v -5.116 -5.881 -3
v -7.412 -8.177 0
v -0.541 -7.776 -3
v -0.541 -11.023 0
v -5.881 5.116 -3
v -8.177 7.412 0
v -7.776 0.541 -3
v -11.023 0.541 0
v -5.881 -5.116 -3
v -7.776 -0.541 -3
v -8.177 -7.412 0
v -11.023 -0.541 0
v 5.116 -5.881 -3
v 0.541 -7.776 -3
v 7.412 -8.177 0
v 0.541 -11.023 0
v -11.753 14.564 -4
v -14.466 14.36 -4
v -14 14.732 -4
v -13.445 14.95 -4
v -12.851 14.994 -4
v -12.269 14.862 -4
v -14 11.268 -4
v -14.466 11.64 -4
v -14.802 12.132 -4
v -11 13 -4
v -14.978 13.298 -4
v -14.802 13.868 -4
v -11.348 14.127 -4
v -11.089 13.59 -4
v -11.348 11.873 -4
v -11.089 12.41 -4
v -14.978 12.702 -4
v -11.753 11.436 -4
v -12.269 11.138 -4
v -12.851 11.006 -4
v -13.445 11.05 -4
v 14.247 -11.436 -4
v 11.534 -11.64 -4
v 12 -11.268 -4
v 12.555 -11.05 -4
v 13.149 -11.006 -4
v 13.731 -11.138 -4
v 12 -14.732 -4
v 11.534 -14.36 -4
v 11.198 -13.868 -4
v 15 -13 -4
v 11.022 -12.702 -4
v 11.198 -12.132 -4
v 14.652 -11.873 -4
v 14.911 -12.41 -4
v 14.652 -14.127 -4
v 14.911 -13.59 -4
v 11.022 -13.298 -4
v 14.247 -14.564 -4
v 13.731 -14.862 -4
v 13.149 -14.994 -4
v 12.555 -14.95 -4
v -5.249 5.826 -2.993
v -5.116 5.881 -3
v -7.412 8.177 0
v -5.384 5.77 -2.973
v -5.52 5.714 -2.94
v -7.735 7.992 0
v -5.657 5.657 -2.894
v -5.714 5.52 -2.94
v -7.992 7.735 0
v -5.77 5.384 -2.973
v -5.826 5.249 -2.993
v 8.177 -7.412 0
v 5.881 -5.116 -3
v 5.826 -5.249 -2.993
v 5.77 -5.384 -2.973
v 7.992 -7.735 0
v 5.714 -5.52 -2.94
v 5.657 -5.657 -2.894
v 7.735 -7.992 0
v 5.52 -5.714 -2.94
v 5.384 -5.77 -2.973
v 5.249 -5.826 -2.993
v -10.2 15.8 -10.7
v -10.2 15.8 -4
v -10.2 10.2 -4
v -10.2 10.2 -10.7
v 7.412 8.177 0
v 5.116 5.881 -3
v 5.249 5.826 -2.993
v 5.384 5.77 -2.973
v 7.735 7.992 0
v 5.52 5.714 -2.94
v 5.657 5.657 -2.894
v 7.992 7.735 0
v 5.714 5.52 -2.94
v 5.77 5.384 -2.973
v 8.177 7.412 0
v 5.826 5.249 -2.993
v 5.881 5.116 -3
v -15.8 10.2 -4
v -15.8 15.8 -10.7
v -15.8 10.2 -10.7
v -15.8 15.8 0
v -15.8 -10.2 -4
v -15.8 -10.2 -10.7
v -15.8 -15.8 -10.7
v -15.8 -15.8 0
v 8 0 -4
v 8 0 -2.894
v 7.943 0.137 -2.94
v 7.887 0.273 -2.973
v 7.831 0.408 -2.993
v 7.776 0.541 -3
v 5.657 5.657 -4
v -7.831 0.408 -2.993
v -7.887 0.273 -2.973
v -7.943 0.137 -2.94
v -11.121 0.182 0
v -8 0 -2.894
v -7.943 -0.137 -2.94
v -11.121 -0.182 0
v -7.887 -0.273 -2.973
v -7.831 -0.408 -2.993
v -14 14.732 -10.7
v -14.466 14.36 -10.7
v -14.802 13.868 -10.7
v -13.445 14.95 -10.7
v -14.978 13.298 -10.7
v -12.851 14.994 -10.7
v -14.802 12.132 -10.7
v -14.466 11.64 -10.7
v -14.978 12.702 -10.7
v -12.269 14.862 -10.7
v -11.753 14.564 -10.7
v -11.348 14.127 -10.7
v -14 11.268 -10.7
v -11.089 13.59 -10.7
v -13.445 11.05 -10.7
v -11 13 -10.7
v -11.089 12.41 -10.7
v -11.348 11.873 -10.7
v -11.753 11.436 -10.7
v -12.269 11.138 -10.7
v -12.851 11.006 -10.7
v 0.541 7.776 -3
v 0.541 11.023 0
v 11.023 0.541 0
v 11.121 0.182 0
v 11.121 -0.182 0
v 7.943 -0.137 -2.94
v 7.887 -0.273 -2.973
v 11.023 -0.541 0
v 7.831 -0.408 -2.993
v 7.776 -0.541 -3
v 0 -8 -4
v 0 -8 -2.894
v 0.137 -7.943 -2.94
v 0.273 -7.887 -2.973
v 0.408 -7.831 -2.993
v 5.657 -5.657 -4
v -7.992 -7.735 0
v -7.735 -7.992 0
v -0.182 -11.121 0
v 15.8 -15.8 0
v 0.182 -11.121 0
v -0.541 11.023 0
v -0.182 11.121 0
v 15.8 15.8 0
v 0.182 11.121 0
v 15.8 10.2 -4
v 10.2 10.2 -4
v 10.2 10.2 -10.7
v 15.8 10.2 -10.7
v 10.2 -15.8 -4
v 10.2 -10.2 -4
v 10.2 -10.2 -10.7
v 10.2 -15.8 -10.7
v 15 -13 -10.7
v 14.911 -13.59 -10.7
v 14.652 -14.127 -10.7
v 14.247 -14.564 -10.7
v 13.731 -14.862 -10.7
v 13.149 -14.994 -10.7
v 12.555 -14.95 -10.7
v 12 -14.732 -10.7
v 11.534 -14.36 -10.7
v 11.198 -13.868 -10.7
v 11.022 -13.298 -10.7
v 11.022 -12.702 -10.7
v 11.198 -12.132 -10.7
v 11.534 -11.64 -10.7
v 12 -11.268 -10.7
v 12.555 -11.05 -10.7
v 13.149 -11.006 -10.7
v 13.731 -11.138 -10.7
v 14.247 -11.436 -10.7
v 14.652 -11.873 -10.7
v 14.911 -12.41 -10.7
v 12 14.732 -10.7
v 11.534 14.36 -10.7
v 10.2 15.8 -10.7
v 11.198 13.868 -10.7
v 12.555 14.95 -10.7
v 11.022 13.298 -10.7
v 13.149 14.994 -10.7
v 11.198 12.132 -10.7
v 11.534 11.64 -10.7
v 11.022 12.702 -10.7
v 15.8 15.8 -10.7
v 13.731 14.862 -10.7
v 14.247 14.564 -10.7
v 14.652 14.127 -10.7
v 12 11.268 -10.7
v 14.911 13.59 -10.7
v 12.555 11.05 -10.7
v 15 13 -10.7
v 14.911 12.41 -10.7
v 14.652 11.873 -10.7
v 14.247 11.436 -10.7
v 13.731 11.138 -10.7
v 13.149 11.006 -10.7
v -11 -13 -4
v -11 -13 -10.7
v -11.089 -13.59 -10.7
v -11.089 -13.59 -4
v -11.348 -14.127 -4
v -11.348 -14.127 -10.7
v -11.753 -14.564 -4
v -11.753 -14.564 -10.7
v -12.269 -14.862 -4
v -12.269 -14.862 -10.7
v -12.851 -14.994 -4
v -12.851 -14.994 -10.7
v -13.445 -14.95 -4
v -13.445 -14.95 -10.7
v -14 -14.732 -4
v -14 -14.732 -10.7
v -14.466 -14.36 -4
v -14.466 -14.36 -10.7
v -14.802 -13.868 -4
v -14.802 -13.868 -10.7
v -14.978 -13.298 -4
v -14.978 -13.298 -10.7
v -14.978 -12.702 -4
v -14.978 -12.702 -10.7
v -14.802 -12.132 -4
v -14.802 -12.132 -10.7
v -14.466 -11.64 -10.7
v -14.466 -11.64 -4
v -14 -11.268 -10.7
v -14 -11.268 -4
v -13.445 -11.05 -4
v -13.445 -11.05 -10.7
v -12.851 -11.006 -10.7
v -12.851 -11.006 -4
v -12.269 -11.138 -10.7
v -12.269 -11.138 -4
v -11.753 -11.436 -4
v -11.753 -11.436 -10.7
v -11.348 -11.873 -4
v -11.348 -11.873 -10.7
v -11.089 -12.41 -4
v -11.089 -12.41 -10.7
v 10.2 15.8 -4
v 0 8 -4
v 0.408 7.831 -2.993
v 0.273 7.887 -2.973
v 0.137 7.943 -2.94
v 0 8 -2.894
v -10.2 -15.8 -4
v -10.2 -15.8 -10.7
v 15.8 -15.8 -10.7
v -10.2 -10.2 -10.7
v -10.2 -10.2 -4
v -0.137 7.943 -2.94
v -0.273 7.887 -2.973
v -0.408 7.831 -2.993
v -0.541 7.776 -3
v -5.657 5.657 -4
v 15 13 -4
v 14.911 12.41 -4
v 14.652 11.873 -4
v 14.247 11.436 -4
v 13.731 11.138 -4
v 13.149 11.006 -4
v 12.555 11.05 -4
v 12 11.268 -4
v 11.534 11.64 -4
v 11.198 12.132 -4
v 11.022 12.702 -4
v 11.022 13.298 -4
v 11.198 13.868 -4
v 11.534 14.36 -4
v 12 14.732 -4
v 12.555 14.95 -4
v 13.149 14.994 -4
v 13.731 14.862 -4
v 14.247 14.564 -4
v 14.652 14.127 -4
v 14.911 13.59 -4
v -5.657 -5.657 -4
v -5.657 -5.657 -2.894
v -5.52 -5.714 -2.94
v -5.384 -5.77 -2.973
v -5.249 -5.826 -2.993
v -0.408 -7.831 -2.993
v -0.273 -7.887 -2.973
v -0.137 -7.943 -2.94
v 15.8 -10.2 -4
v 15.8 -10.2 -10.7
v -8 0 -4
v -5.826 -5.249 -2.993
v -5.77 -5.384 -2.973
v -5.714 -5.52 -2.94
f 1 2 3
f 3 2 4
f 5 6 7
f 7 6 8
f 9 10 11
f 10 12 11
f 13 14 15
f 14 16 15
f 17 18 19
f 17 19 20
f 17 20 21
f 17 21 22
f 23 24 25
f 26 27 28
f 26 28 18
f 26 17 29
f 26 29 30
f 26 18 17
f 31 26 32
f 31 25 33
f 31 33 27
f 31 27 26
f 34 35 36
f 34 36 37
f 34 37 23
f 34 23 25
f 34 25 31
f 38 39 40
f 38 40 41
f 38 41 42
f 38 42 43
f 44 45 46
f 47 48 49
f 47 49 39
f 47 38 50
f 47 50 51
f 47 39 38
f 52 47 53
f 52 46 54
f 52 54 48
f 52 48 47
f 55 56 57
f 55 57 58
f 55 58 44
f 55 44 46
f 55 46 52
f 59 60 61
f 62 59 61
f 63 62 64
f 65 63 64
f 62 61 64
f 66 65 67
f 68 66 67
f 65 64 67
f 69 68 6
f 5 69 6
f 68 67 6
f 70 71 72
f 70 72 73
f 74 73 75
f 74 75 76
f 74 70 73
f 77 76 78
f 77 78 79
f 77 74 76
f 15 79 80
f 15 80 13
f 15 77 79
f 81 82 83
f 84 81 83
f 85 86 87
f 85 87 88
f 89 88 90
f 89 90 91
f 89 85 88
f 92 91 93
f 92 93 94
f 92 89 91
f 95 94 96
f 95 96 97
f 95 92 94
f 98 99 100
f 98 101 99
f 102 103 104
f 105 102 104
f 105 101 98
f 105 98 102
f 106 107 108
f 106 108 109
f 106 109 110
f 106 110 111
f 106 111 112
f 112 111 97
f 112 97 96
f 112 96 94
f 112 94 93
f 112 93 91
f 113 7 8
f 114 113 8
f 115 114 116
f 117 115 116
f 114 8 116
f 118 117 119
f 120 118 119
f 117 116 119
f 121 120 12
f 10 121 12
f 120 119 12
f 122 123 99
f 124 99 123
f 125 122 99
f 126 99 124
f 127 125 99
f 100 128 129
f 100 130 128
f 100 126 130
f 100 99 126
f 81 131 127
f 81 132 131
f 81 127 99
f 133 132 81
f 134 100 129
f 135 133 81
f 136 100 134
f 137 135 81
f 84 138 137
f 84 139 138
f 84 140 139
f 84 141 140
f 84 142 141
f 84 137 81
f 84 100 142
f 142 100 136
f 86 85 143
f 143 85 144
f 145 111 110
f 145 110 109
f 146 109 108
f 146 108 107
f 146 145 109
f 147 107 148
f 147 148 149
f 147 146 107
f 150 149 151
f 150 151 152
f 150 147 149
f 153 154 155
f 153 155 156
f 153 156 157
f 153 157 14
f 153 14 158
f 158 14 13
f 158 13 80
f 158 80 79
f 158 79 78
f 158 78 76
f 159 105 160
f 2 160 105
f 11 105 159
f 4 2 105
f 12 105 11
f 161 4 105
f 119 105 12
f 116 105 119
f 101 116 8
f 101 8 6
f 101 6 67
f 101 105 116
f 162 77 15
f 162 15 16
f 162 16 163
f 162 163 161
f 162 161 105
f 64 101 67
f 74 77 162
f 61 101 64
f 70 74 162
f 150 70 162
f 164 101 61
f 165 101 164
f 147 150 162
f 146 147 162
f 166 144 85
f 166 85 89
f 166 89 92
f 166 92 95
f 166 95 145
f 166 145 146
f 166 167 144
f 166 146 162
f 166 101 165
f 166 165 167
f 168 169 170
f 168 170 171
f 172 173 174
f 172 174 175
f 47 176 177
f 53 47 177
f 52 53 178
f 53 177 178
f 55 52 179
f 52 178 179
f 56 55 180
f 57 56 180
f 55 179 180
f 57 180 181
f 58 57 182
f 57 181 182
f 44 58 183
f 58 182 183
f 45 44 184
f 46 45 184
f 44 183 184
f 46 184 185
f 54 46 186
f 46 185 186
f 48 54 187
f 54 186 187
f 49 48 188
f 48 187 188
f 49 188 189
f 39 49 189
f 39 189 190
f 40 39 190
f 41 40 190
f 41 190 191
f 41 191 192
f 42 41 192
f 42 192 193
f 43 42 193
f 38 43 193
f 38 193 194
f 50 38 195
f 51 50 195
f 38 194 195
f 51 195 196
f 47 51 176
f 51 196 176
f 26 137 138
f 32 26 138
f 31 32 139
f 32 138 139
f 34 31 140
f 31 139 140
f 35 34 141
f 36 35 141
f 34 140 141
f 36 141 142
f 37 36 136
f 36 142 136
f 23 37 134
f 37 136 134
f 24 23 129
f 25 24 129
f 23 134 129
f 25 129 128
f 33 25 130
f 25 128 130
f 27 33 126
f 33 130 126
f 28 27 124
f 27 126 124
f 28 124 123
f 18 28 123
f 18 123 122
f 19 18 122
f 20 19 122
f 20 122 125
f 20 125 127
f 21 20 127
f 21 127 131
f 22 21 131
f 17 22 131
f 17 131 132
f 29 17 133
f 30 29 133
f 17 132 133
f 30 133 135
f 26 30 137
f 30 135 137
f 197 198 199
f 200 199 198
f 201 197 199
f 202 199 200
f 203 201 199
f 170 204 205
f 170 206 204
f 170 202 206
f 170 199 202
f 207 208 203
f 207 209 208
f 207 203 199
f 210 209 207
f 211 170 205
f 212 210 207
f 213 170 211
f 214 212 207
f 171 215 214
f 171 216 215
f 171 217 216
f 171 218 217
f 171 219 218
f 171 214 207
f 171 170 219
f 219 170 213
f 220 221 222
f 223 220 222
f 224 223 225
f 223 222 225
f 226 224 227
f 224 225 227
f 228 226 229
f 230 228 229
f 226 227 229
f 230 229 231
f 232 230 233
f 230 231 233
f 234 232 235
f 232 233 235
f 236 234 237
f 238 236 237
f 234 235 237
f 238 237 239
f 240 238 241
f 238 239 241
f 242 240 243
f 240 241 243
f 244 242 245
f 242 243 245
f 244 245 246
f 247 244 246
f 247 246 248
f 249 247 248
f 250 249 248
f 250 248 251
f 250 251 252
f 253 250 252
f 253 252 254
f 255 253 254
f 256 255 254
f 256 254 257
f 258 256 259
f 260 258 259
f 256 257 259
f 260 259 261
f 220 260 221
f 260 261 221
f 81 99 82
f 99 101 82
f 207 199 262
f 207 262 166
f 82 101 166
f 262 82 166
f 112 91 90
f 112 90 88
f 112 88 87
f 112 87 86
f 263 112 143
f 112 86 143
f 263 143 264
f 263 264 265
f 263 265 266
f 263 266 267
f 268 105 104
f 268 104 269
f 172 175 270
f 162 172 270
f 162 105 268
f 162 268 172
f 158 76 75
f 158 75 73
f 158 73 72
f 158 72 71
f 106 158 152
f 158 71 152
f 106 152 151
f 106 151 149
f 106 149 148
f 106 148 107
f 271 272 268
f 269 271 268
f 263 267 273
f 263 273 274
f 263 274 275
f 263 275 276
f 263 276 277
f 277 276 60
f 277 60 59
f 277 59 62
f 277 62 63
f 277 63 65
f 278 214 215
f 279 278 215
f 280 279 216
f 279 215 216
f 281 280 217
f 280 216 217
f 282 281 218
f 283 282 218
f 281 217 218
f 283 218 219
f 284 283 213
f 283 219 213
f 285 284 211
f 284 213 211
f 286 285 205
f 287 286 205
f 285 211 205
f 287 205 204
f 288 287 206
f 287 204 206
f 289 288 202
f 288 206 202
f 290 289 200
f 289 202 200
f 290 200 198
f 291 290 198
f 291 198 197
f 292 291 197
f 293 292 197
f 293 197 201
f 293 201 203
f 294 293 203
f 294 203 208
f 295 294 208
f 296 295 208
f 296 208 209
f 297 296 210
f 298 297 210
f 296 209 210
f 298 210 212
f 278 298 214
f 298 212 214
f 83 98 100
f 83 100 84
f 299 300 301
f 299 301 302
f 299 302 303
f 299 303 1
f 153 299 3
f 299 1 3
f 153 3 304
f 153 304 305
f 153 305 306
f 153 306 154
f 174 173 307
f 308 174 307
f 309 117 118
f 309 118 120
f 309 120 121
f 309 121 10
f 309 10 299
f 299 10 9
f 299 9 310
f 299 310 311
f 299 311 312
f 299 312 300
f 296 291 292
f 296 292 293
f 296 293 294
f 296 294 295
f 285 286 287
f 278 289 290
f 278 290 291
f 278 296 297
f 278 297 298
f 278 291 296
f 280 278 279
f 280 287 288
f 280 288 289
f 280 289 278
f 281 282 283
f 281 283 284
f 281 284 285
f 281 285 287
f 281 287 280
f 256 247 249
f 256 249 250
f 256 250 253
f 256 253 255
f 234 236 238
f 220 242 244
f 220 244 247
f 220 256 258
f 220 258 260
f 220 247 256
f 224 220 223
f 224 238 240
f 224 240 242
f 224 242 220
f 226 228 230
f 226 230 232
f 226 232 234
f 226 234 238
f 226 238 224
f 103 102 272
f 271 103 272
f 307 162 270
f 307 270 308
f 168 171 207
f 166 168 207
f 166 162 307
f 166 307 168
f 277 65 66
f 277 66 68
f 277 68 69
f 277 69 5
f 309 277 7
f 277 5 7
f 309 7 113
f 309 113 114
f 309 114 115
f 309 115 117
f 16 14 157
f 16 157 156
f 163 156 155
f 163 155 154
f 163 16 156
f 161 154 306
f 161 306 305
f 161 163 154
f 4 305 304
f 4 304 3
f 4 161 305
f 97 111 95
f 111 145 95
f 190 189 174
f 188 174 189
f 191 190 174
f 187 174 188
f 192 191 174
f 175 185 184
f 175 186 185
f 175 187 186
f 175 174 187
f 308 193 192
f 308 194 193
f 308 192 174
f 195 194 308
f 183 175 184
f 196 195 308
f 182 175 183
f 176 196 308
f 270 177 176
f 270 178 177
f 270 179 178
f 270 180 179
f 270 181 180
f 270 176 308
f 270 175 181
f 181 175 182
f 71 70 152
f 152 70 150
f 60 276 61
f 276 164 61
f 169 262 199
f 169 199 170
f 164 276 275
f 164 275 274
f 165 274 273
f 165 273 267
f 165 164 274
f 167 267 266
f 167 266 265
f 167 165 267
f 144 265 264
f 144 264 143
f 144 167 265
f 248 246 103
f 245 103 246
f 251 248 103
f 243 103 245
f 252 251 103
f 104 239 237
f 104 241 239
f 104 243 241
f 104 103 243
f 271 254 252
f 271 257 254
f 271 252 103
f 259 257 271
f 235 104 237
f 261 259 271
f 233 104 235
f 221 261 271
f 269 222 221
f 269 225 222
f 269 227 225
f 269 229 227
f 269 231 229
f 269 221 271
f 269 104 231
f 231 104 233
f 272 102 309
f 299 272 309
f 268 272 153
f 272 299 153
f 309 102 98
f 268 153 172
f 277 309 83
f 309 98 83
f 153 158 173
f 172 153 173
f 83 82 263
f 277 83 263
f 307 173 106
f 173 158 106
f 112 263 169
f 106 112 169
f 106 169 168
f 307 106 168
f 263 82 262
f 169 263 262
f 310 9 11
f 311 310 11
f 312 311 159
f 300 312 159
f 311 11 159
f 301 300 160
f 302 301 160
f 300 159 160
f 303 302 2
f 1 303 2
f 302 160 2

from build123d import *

# Parameters (mm, degrees)
SKETCH020_W     = 31.6
SKETCH020_H     = 31.6
PAD010_DEPTH    = 4
CHAMFER_SIZE    = 3
FILLET011_R     = 2
SKETCH021_W     = 5.6
SKETCH021_H     = 5.6
PAD011_DEPTH    = 6.7
SKETCH022_R     = 2
POCKET004_DEPTH = 6.7


with BuildPart() as part:
    # Sketch020 → Pad010 (new body)
    with BuildSketch(Plane.XY):
        Rectangle(SKETCH020_W, SKETCH020_H)
        Polygon((0, 8), (-5.656854, 5.656854), (-8, 0), (-5.656854, -5.656854), (0, -8), (5.656854, -5.656854), (8, 0), (5.656854, 5.656854), align=None, mode=Mode.SUBTRACT)
    extrude(amount=-PAD010_DEPTH)

    # Chamfer
    chamfer_edges = [part.edges().sort_by_distance(p)[0] for p in [
        (2.828427, 6.828427, 0),
        (6.828427, 2.828427, 0),
        (6.828427, -2.828427, 0),
        (2.828427, -6.828427, 0),
        (-2.828427, -6.828427, 0),
        (-6.828427, -2.828427, 0),
        (-6.828427, 2.828427, 0),
        (-2.828427, 6.828427, 0),
    ]]
    chamfer(chamfer_edges, length=CHAMFER_SIZE)

    # Fillet011
    fillet011_edges = [part.edges().sort_by_distance(p)[0] for p in [
        (-6.804905, 6.804905, -1.5),
        (0, 9.623588, -1.5),
        (6.804905, 6.804905, -1.5),
        (9.623588, 0, -1.5),
        (-6.804905, -6.804905, -1.5),
        (-9.623588, 0, -1.5),
        (0, -9.623588, -1.5),
        (6.804905, -6.804905, -1.5),
    ]]
    fillet(fillet011_edges, radius=FILLET011_R)

    # Sketch021 (on Face4 of Fillet011) → Pad011 (join)
    with BuildSketch(Plane(origin=(0, 0, -4), x_dir=(1, 0, 0), z_dir=(0, 0, -1))):
        with Locations((-13, -13)):
            Rectangle(SKETCH021_W, SKETCH021_H)
        with Locations((13, -13)):
            Rectangle(SKETCH021_W, SKETCH021_H)
        with Locations((13, 13)):
            Rectangle(SKETCH021_W, SKETCH021_H)
        with Locations((-13, 13)):
            Rectangle(SKETCH021_W, SKETCH021_H)
    extrude(amount=PAD011_DEPTH)

    # Sketch022 (on Face43 of Pad011) → Pocket004 (cut)
    with BuildSketch(Plane(origin=(0, 0, -10.7), x_dir=(1, 0, 0), z_dir=(0, 0, -1))):
        with Locations((-13, 13)):
            Circle(SKETCH022_R)
        with Locations((13, 13)):
            Circle(SKETCH022_R)
        with Locations((13, -13)):
            Circle(SKETCH022_R)
        with Locations((-13, -13)):
            Circle(SKETCH022_R)
    extrude(amount=-POCKET004_DEPTH, mode=Mode.SUBTRACT)


solid = part.part
